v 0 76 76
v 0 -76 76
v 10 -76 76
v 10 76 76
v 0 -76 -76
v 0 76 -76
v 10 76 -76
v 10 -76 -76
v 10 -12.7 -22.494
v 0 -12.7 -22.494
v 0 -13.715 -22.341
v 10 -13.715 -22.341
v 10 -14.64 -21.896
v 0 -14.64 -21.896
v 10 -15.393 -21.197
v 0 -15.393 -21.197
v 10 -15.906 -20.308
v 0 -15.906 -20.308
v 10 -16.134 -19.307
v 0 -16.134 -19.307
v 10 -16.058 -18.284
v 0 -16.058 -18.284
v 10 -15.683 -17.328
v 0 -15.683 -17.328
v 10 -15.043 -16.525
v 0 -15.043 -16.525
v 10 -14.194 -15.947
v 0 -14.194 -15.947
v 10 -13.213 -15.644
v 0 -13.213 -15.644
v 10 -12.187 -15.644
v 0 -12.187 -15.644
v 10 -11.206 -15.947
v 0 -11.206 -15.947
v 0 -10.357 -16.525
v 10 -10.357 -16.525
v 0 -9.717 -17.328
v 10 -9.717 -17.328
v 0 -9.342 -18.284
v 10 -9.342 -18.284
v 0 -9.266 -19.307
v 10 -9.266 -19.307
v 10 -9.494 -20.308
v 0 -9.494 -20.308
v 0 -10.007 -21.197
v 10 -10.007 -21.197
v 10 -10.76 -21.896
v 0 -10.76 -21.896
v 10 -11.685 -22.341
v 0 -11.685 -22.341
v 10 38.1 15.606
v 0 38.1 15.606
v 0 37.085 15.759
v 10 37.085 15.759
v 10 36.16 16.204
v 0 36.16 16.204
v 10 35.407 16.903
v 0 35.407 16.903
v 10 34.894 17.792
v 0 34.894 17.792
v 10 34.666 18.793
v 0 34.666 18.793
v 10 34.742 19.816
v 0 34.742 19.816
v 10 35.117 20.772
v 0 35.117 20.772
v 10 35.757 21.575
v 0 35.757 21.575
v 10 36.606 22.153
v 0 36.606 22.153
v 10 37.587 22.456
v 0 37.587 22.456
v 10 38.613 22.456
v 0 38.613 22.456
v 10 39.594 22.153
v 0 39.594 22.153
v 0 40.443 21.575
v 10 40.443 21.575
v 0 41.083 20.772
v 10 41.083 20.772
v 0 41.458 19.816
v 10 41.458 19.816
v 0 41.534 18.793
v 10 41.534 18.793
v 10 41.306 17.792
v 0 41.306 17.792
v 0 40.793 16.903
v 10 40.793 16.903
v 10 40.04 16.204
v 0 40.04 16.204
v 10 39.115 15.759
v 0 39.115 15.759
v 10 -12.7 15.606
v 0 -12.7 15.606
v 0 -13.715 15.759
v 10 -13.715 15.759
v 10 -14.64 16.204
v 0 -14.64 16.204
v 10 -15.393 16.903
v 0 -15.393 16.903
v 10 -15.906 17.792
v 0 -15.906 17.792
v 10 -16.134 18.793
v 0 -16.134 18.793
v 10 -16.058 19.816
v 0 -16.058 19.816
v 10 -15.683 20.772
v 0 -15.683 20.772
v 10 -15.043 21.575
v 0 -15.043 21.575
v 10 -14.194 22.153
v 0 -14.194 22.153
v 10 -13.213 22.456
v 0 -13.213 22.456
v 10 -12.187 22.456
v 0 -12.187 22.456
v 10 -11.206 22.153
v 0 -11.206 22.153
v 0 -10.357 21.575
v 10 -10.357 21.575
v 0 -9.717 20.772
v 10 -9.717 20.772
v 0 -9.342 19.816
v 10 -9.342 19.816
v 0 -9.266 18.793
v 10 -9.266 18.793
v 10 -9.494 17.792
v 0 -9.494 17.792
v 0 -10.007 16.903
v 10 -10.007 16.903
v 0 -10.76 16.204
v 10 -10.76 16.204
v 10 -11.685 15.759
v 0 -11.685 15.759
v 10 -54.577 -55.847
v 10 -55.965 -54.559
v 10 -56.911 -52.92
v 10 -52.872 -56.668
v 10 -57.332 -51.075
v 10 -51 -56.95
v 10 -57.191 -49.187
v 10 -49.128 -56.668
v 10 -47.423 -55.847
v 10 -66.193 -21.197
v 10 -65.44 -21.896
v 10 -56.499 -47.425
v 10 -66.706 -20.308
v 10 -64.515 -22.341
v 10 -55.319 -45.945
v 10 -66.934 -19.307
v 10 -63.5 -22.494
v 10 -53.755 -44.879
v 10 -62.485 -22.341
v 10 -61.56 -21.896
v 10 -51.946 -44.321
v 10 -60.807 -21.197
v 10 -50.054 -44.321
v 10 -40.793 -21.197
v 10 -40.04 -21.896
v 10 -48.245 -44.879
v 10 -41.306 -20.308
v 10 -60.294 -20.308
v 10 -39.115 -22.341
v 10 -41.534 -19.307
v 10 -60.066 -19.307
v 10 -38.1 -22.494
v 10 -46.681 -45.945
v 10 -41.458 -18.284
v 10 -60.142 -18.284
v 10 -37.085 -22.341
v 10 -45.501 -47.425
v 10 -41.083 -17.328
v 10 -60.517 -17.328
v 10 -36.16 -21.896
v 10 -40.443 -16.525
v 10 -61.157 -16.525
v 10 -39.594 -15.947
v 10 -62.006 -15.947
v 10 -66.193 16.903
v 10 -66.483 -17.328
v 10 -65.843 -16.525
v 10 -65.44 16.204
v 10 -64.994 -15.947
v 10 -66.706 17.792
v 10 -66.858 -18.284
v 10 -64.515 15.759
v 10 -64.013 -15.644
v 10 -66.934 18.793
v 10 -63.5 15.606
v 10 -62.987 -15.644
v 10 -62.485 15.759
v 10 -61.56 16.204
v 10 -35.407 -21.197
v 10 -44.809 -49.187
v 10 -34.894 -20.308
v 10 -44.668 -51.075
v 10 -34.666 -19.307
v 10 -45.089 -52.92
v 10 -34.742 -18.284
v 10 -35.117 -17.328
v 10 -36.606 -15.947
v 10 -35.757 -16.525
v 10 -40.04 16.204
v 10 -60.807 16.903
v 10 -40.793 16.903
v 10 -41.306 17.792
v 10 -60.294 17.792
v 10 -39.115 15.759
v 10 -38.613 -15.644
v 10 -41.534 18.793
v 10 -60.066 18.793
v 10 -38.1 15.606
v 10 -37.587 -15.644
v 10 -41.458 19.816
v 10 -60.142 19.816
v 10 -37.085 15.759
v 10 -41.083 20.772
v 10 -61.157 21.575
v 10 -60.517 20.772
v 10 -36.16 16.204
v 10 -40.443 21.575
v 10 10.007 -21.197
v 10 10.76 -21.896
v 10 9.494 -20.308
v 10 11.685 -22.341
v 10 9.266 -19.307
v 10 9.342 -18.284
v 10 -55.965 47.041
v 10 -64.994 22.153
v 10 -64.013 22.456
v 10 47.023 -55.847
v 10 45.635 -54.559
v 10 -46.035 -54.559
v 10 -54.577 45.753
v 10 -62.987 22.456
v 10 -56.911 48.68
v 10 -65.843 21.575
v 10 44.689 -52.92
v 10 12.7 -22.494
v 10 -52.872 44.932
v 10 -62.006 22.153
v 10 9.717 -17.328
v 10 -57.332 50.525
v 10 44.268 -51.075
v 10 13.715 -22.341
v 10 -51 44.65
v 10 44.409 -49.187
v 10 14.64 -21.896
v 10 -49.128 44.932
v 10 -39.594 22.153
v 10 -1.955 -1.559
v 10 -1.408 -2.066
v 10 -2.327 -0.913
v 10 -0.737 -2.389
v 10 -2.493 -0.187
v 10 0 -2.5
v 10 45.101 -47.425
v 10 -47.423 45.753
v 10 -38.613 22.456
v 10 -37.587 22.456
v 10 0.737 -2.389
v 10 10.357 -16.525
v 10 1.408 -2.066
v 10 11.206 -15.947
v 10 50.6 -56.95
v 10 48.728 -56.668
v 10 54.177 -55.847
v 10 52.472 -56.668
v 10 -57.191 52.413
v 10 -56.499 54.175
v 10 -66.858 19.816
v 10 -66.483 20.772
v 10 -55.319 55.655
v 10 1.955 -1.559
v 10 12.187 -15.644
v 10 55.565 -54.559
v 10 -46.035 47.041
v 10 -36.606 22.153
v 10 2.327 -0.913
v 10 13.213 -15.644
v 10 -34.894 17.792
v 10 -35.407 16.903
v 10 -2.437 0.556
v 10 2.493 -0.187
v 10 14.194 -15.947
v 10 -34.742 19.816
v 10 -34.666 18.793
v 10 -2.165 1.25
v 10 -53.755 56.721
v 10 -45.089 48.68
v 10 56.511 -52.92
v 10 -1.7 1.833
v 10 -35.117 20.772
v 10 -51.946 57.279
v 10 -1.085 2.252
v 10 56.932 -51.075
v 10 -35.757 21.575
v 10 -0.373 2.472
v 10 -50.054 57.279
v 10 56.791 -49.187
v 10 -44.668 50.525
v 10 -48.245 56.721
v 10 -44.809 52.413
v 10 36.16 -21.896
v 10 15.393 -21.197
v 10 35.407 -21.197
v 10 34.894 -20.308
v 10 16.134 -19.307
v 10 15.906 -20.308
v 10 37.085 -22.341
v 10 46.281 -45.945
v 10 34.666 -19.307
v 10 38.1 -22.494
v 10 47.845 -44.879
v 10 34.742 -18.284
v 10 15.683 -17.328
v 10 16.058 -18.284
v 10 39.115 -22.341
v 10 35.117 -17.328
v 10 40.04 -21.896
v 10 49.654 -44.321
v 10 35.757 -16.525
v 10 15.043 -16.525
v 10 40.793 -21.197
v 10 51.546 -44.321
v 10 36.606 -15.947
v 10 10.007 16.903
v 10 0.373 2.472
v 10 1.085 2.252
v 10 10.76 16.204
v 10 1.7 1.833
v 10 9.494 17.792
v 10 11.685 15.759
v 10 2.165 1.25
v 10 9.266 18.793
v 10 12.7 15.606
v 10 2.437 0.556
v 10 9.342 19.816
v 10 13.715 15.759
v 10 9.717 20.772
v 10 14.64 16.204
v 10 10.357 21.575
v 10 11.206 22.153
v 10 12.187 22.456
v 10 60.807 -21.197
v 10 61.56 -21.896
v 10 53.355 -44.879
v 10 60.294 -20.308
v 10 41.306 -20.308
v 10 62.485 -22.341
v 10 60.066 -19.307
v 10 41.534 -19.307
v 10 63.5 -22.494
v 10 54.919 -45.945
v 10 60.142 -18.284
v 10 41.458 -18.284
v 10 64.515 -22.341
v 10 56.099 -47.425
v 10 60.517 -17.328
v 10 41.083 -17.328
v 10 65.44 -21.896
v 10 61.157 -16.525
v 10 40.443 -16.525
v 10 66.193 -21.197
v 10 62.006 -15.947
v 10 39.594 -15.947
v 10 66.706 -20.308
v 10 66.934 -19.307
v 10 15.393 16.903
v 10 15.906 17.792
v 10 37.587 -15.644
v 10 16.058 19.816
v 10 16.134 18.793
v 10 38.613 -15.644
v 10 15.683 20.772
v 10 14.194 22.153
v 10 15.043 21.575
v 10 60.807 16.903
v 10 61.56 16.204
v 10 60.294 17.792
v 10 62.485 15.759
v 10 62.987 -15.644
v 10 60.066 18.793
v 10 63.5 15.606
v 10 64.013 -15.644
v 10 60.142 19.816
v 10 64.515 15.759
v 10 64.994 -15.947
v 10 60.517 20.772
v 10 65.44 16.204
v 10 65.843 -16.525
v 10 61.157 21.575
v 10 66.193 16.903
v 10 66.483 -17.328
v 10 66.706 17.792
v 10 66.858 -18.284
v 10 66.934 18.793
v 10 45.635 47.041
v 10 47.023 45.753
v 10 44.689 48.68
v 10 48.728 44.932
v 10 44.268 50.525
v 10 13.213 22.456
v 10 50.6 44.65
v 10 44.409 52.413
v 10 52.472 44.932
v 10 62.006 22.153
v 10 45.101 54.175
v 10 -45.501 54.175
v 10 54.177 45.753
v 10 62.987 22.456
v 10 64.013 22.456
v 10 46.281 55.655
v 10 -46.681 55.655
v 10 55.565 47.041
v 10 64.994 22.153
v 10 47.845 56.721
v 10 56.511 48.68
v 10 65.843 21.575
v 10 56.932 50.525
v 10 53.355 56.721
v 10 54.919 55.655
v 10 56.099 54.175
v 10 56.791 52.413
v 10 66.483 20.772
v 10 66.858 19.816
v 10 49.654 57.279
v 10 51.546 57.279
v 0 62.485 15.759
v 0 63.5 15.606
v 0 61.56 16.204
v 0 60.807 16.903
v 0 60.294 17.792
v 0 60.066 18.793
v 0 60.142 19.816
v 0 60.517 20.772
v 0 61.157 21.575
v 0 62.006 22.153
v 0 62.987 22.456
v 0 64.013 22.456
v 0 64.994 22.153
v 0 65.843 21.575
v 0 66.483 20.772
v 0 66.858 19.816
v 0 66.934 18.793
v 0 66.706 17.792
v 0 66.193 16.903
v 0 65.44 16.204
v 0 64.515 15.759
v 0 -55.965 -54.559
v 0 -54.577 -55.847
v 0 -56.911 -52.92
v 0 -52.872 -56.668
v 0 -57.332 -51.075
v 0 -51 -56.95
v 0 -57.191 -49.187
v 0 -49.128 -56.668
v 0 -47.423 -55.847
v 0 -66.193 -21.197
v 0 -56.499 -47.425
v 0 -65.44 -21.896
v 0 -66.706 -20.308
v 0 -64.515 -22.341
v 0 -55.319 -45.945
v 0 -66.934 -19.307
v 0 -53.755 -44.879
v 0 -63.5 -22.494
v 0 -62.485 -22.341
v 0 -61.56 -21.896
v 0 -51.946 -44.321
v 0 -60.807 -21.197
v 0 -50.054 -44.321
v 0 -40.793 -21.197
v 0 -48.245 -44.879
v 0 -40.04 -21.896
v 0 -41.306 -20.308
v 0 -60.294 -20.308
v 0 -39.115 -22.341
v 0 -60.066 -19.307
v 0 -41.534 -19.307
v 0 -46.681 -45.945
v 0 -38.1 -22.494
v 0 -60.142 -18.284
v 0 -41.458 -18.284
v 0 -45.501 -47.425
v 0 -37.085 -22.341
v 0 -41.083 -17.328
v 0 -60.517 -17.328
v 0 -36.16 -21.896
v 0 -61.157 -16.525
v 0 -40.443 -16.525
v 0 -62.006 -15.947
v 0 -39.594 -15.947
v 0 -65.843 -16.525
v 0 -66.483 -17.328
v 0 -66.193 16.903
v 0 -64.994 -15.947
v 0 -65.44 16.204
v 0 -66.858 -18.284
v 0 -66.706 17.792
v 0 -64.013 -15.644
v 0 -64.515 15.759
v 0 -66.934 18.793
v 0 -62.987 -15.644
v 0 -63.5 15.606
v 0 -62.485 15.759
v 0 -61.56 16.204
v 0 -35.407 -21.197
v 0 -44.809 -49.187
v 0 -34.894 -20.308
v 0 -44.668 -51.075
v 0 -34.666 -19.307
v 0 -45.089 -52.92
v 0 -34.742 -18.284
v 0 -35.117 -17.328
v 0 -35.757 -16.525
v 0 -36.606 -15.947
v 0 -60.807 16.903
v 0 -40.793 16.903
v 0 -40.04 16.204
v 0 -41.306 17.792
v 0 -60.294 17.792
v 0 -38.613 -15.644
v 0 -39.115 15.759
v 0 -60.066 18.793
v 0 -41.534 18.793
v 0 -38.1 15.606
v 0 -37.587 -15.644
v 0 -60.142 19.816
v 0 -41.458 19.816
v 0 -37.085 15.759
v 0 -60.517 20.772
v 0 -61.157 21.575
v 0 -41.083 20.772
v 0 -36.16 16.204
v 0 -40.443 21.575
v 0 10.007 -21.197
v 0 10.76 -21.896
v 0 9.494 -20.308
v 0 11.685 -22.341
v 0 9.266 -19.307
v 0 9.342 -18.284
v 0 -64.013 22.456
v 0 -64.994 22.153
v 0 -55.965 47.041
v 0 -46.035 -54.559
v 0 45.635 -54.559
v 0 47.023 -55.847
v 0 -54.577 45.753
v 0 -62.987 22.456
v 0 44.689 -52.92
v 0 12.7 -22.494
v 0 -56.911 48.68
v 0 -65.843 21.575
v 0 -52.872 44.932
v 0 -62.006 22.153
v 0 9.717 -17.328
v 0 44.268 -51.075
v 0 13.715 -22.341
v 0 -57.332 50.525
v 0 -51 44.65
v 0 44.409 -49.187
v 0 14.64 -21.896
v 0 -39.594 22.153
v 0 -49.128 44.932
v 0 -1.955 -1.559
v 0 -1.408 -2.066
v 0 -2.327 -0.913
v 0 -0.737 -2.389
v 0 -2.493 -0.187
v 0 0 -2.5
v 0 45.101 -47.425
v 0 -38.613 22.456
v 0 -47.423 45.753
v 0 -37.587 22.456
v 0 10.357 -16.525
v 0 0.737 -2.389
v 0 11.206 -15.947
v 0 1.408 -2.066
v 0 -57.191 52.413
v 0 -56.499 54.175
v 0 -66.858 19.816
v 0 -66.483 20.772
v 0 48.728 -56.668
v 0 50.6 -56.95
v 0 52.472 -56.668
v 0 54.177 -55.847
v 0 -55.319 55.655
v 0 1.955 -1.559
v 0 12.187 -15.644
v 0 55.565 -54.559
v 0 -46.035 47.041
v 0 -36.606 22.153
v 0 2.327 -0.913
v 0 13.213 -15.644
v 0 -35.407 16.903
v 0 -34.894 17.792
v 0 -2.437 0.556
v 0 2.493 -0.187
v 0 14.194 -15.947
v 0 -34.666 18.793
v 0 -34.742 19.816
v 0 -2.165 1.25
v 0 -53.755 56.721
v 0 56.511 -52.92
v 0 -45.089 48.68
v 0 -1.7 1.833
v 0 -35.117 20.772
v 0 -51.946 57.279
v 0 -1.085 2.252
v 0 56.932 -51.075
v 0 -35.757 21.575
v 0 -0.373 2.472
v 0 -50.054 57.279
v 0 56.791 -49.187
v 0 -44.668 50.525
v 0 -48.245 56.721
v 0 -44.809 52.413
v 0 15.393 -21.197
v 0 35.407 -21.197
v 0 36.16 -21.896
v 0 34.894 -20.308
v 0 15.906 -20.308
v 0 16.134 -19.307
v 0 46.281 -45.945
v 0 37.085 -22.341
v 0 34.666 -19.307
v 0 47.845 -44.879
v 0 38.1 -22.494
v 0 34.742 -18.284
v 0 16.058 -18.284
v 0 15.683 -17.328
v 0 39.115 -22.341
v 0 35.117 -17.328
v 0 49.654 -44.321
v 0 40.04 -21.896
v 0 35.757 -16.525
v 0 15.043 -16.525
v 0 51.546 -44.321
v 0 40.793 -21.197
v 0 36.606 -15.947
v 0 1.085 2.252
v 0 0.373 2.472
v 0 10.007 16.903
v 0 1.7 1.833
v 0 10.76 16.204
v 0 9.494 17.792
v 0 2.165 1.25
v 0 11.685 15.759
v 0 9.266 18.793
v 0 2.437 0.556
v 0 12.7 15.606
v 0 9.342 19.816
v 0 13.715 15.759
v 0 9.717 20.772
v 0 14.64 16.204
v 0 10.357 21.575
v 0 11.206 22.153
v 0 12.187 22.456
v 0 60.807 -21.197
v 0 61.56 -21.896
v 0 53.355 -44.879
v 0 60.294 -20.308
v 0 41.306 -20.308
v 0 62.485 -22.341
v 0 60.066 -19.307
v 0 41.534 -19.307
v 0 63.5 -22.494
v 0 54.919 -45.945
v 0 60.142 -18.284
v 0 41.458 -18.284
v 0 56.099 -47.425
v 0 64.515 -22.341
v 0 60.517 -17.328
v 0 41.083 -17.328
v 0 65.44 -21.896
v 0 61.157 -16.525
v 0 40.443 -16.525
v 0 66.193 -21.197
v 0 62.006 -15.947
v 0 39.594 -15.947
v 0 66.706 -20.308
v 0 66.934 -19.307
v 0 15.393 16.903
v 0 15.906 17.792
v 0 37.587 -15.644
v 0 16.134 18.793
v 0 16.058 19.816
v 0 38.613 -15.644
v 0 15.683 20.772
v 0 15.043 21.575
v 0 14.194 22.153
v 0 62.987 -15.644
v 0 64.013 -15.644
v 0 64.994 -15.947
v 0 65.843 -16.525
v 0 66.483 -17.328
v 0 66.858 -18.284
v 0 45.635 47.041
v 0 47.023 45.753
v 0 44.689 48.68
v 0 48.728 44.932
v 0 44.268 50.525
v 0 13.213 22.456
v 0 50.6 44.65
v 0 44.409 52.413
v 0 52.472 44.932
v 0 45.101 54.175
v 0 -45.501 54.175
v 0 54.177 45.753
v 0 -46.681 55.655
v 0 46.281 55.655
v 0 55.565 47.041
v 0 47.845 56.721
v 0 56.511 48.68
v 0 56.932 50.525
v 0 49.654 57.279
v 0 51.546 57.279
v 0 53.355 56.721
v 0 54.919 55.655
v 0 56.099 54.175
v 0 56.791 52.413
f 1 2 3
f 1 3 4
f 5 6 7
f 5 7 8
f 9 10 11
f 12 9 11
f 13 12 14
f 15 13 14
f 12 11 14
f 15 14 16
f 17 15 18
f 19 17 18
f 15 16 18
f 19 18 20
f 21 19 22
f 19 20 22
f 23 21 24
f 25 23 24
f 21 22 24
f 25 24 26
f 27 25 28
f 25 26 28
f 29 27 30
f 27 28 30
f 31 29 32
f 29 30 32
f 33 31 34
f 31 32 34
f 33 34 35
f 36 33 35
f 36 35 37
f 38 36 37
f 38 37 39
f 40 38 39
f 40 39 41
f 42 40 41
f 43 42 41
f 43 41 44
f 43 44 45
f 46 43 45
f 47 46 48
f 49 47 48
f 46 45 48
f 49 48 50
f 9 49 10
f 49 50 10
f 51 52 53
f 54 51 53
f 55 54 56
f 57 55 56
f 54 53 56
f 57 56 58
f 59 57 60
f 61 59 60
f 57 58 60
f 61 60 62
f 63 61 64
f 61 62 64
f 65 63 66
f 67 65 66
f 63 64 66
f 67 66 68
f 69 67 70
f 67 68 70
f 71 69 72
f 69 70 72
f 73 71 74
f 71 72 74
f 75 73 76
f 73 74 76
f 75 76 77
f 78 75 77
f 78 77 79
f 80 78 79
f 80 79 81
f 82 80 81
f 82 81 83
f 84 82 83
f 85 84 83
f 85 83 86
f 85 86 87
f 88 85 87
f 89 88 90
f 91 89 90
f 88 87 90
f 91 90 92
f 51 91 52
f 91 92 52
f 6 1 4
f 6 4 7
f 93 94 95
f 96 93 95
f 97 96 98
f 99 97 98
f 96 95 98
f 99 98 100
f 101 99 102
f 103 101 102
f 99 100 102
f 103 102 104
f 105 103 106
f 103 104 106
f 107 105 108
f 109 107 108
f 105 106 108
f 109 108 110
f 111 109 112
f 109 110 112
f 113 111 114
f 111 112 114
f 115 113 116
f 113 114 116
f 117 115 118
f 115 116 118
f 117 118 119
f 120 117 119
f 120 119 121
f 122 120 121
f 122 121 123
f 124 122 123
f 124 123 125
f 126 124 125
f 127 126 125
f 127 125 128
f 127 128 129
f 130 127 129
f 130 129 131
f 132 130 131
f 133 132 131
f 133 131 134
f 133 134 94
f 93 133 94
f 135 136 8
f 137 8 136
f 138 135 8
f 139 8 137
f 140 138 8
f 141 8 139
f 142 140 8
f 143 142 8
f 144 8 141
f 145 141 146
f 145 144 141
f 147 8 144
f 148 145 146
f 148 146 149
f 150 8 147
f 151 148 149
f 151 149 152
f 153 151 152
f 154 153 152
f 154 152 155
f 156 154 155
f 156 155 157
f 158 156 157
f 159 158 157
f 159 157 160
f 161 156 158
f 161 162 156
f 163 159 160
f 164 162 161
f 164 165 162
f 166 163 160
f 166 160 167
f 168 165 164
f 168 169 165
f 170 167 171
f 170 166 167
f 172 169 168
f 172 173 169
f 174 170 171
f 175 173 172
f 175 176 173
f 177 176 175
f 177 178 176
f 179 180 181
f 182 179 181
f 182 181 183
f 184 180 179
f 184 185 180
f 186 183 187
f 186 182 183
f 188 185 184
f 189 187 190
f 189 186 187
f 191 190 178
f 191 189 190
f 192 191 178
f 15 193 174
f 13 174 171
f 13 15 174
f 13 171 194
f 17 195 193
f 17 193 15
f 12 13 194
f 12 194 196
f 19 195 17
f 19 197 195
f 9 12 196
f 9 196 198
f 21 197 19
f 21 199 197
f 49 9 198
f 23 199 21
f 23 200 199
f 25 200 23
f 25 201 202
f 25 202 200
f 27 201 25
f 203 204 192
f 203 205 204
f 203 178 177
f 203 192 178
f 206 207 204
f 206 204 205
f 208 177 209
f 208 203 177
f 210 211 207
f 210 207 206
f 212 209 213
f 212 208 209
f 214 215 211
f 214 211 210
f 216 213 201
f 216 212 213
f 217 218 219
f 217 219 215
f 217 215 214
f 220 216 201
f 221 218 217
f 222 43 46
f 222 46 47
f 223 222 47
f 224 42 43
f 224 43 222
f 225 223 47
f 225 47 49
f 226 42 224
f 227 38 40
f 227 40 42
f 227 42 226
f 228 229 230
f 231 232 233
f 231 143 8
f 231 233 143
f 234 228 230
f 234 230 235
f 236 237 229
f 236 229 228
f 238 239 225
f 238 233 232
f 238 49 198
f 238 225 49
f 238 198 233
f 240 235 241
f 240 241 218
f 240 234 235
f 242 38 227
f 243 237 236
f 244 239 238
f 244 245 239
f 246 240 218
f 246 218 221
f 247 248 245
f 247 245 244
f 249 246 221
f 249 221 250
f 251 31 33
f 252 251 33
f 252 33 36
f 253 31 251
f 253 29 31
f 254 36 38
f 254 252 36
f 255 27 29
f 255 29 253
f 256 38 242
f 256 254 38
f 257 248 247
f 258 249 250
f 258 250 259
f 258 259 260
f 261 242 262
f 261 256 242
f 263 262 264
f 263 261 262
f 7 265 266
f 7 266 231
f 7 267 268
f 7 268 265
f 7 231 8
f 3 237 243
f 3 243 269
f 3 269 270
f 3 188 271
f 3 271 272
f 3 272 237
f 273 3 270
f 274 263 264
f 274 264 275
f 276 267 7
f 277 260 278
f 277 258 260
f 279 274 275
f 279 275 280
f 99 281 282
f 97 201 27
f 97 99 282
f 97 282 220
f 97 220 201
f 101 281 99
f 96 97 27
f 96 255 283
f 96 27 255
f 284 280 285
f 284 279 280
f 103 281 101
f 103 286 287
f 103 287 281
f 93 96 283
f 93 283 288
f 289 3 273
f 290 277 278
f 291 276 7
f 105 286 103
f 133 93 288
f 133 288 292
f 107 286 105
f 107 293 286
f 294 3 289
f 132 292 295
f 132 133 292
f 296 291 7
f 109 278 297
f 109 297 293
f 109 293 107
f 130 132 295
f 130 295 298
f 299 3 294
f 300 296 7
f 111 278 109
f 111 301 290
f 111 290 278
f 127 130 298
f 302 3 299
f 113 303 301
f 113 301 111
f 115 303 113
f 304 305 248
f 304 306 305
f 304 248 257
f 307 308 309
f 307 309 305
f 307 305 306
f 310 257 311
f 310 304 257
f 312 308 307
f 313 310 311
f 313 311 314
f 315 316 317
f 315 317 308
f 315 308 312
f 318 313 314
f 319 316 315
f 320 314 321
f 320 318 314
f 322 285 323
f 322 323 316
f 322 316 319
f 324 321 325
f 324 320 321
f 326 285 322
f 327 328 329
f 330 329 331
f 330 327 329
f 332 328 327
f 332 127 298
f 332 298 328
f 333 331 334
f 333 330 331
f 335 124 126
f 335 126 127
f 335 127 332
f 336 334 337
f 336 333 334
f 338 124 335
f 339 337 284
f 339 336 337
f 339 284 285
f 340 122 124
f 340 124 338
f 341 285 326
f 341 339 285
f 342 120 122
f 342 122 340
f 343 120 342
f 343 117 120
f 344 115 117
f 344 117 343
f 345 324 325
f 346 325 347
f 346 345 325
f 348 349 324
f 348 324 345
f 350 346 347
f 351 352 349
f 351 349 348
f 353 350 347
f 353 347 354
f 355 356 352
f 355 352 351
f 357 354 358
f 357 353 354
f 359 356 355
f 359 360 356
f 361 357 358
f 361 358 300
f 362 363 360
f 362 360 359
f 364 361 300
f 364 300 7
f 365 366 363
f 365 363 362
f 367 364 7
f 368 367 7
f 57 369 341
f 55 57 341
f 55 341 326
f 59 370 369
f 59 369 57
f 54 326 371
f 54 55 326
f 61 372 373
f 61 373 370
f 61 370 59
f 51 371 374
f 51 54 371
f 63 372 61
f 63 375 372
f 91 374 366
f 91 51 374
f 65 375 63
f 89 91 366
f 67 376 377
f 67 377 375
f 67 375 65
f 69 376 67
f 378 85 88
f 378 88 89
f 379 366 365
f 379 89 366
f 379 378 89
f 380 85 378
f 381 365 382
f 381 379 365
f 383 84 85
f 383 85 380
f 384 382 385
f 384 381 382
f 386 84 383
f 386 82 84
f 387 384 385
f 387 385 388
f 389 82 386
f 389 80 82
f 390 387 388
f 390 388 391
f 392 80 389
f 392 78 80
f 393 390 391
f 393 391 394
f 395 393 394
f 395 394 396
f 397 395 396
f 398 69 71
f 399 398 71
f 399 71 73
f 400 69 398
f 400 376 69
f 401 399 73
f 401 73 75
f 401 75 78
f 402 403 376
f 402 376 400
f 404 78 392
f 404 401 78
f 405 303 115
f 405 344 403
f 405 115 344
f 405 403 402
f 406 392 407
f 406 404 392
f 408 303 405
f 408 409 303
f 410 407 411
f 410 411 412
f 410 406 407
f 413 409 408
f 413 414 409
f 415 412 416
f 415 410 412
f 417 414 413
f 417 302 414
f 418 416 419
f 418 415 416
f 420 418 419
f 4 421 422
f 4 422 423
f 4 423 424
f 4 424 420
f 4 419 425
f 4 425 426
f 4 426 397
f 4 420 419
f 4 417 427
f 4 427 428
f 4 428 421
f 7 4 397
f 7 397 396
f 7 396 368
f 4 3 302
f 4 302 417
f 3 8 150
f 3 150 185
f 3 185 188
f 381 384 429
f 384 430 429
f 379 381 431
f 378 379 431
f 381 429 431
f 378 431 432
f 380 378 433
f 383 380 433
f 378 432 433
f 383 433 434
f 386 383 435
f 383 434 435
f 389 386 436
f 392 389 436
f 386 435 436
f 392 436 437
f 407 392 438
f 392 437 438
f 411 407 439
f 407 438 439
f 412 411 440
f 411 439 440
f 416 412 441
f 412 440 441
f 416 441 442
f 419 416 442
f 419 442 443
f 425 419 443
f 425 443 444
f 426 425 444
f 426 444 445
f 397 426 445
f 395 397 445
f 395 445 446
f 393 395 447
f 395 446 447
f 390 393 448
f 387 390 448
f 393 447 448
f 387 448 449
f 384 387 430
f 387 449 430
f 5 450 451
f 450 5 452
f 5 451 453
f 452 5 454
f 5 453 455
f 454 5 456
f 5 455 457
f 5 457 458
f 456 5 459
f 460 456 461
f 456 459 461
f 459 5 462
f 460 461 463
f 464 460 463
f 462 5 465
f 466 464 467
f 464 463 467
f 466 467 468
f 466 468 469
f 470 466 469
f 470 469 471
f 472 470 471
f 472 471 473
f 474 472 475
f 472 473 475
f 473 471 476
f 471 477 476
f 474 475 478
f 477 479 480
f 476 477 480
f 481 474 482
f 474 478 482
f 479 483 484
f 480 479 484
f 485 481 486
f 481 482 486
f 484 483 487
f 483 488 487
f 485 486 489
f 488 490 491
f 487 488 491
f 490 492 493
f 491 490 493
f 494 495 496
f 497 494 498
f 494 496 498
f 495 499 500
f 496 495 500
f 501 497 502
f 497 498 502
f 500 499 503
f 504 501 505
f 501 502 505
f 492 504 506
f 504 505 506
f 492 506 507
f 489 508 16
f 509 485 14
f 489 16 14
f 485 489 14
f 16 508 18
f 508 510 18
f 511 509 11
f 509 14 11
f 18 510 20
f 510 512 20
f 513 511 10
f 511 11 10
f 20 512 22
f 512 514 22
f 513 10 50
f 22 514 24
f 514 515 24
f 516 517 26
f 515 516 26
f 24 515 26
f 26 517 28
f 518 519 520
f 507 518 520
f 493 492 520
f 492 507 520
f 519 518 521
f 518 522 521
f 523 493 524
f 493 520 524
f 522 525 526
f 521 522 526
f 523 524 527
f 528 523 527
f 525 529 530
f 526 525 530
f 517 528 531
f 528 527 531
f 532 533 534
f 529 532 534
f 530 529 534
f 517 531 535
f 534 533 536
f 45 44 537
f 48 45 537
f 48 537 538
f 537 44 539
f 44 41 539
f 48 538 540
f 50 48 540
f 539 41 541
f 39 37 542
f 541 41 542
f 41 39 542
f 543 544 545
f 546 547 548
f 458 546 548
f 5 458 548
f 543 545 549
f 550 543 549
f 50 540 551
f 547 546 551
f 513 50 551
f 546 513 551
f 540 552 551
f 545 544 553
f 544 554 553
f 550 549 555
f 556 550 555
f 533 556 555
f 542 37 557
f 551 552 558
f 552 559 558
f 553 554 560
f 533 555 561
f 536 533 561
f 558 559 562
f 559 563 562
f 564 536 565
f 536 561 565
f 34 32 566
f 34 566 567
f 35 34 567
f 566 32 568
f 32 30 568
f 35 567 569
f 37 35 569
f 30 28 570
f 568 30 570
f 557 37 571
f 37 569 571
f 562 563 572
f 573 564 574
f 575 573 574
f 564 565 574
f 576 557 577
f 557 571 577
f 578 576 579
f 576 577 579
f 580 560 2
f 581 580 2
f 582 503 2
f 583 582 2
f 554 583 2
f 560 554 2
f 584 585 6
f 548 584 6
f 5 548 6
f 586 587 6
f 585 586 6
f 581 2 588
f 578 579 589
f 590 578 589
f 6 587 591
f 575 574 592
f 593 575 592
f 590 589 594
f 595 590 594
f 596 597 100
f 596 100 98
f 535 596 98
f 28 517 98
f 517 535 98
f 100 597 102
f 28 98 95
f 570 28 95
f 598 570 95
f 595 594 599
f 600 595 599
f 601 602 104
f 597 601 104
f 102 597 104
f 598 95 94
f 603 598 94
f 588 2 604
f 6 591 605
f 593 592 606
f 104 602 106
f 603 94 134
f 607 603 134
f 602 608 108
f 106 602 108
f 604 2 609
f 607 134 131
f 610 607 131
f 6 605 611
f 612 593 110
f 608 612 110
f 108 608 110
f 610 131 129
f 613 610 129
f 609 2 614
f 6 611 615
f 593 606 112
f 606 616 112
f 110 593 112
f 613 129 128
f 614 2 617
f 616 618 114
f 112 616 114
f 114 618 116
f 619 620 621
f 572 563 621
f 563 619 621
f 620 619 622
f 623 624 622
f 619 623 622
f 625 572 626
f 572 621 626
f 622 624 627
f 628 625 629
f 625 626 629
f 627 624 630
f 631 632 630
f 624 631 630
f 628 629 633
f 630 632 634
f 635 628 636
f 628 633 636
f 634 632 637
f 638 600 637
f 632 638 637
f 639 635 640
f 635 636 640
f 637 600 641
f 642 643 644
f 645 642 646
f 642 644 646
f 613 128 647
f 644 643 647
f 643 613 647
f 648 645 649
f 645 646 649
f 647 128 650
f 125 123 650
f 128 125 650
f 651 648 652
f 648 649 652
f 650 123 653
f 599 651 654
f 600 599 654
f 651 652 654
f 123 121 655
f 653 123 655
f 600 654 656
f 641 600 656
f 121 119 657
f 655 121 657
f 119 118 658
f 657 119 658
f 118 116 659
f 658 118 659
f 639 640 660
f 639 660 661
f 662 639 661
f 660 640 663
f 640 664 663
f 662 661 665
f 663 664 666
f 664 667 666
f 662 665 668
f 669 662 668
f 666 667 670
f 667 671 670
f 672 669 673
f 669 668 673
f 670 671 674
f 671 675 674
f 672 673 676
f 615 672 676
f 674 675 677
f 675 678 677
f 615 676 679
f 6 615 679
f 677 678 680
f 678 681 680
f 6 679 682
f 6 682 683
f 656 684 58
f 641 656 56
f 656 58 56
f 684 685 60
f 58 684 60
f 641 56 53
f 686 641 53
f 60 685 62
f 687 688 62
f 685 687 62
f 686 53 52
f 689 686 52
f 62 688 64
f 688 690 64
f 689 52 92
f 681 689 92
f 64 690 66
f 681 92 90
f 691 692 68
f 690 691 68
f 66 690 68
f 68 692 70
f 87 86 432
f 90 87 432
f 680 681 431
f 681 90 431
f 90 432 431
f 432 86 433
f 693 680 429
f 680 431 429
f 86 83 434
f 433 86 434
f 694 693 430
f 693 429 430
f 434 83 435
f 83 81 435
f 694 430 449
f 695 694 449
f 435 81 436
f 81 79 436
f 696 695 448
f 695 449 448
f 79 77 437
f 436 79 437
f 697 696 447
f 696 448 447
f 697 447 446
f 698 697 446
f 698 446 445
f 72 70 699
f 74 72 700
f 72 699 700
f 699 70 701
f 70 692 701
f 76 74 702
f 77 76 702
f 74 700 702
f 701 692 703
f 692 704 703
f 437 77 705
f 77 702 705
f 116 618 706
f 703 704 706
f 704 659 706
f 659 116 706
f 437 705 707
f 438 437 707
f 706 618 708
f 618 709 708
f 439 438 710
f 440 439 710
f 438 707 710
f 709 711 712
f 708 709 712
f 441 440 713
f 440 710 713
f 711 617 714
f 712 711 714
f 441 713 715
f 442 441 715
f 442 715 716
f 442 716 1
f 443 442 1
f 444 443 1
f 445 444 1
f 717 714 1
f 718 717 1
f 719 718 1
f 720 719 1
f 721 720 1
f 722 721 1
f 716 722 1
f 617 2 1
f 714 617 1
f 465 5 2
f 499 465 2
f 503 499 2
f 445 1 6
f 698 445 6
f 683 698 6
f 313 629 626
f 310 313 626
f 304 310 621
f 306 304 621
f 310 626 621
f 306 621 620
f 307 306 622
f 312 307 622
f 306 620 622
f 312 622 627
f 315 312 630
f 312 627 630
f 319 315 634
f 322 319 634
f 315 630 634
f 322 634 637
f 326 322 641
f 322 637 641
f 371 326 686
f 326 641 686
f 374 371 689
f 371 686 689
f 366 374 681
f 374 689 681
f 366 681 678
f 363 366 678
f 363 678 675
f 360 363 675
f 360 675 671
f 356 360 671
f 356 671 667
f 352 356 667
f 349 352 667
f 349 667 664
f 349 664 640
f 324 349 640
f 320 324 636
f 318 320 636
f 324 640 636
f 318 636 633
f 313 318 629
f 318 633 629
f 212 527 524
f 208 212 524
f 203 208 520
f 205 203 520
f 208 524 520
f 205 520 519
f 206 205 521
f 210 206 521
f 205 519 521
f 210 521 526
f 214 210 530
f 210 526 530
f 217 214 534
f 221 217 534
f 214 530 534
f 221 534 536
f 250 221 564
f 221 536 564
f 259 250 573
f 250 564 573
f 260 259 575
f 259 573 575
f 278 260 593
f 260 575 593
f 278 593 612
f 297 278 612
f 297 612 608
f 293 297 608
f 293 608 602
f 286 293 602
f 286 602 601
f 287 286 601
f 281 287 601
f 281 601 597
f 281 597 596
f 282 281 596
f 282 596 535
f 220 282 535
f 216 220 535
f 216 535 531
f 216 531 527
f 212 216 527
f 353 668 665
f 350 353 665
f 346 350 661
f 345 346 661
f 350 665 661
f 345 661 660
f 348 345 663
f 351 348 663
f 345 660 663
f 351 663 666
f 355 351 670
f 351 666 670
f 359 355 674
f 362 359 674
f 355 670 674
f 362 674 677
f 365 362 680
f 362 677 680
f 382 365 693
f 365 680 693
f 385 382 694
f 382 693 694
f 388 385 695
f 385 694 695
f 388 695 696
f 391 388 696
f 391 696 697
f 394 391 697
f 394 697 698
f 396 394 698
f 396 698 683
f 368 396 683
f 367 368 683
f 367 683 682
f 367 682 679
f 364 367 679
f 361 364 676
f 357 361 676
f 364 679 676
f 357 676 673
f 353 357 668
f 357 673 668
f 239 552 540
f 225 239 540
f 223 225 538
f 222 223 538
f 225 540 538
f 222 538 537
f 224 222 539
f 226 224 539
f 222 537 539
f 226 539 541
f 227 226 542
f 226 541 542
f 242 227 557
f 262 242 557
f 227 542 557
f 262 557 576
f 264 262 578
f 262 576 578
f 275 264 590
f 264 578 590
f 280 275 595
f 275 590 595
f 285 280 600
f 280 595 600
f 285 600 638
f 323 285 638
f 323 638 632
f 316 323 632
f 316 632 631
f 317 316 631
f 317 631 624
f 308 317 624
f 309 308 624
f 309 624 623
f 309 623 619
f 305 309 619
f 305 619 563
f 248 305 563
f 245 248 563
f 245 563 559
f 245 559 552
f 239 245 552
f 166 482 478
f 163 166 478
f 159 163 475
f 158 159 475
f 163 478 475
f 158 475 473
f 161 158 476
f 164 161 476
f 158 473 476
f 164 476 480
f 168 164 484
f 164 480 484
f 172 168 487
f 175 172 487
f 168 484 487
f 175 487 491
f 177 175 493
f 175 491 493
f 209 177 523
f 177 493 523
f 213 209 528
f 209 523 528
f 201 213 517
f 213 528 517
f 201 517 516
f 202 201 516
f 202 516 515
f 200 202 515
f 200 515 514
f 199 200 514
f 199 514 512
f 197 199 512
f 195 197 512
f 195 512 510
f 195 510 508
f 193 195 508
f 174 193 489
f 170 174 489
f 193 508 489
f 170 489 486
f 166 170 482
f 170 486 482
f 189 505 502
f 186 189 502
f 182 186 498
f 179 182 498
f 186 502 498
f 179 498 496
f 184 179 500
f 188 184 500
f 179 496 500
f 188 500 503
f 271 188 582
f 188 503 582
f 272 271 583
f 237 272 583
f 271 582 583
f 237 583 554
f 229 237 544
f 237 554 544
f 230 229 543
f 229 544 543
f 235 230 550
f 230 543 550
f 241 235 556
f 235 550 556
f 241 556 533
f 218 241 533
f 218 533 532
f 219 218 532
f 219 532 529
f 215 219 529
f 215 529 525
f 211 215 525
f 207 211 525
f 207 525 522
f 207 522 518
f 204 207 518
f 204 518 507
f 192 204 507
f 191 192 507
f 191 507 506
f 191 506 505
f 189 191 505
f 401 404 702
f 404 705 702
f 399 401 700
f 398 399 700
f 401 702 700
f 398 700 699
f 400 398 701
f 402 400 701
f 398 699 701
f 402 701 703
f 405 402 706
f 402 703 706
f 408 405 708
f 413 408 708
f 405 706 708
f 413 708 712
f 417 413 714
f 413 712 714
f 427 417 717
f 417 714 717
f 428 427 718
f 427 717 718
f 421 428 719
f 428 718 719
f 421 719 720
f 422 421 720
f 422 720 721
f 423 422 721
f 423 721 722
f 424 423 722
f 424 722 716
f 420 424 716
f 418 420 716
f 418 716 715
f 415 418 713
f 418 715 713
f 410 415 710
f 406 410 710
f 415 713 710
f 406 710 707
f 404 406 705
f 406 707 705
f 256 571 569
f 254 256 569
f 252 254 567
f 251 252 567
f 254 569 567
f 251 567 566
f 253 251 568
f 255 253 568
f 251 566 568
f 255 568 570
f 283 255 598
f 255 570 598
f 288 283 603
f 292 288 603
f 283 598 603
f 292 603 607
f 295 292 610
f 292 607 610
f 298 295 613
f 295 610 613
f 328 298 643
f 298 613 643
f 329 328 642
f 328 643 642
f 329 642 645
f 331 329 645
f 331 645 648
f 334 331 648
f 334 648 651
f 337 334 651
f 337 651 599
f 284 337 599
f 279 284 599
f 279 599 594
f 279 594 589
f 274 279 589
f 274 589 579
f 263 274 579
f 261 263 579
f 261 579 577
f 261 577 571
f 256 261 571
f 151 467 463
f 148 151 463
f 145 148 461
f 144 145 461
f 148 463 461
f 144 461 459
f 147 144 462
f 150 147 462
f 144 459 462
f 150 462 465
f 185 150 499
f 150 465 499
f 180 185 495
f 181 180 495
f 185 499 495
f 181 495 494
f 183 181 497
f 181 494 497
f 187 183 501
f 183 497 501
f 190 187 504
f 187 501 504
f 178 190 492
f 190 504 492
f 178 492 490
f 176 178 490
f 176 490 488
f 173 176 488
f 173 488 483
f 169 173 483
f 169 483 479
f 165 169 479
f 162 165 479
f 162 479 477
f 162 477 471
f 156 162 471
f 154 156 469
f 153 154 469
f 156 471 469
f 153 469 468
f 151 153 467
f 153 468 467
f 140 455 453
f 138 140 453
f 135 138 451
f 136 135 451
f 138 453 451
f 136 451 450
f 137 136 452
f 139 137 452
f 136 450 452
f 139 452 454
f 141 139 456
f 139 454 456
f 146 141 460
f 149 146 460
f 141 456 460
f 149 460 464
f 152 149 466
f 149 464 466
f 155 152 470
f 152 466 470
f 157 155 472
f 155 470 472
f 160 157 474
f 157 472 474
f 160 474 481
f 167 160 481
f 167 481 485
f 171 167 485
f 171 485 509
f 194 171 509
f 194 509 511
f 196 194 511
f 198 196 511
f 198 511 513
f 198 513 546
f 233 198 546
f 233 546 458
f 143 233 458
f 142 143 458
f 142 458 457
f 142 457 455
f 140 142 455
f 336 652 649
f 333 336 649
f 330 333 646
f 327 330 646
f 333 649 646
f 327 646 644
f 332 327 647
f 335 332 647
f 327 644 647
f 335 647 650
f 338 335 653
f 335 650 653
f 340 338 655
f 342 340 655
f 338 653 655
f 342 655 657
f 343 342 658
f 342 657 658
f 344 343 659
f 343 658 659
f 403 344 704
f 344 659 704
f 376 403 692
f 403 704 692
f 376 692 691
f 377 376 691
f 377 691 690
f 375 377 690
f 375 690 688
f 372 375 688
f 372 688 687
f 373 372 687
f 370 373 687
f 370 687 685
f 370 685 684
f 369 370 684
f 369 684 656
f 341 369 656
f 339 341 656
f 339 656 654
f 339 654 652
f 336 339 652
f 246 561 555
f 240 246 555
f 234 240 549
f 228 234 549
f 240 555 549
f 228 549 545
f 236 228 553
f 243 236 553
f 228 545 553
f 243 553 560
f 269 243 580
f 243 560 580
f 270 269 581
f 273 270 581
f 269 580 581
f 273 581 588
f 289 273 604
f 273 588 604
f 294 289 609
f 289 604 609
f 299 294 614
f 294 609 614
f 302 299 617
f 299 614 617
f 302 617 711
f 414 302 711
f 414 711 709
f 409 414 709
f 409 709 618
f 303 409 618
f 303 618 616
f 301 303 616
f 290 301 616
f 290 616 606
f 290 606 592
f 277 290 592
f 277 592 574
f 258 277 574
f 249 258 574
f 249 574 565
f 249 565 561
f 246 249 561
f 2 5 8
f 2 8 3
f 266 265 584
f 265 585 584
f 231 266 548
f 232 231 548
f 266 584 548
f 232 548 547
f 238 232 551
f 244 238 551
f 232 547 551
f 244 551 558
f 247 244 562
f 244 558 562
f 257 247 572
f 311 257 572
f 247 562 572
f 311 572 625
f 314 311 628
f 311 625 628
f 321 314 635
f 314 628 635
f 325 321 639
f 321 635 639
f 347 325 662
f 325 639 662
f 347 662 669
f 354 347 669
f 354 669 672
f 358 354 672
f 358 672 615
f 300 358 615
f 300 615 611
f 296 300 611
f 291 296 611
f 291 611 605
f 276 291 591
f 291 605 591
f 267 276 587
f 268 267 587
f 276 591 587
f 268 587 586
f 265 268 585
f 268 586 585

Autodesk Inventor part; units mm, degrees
ref_plane "YZ Plane" through (0, 0, 0) normal (1, 0, 0) x (0, 1, 0)
ref_plane "XZ Plane" through (0, 0, 0) normal (0, 1, 0) x (-1, 0, 0)
ref_plane "XY Plane" through (0, 0, 0) normal (0, 0, 1) x (1, 0, 0)
sketch "Sketch5" plane through (0, 0, 0) normal (1, 0, 0) x (0, 1, 0)
  line L0 (76, -76) -> (-76, -76)
  line L1 (-76, -76) -> (-76, 76)
  line L2 (-76, 76) -> (76, 76)
  line L3 (76, 76) -> (76, -76)
  line L4 (76, -76) -> (-76, 76) construction
  line L5 (-76, -76) -> (76, 76) construction
  point P0 (0, 0)
  dimension "d31" = 152
  dimension "d32" = 152
extrude "Extrusion2" add sketch "Sketch5" along normal blind 10
sketch "Sketch6" plane through (10, 0, 0) normal (1, 0, 0) x (0, 0, -1)
  line L0 (76, -76) -> (76, 76) projected
  line L1 (76, 76) -> (-76, 76) projected
  point P0 (0, 0)
  point P1 (50.6, 50.6)
  dimension "d42" = 25.4
  dimension "d43" = 25.4
hole "Hole4" at (10, 50.6, -50.6) direction (-1, 0, 0) diameter 12.7 end through all
sketch "Sketch7" plane through (10, 0, 0) normal (1, 0, 0) x (0, 0, -1)
  circle A0 centre (50.6, 50.6) radius 6.35 projected
  line L0 (76, 76) -> (-76, 76) projected
  point P0 (0, 0)
  point P1 (-51, 50.6)
  dimension "d51" = 101.6
  dimension "d52" = 25.4
hole "Hole5" at (10, 50.6, 51) direction (-1, 0, 0) diameter 12.7 end through all
sketch "Sketch8" plane through (10, 0, 0) normal (1, 0, 0) x (0, 0, -1)
  line L0 (76, -76) -> (76, 76) projected
  circle A0 centre (50.6, 50.6) radius 6.35 projected
  point P0 (0, 0)
  point P1 (50.6, -51)
  dimension "d60" = 25.4
  dimension "d61" = 101.6
hole "Hole6" at (10, -51, -50.6) direction (-1, 0, 0) diameter 12.7 end through all
sketch "Sketch9" plane through (10, 0, 0) normal (1, 0, 0) x (0, 0, -1)
  circle A0 centre (-51, 50.6) radius 6.35 projected
  circle A1 centre (50.6, -51) radius 6.35 projected
  point P0 (0, 0)
  point P1 (-51, -51)
  dimension "d69" = 101.6
  dimension "d70" = 101.6
hole "Hole7" at (10, -51, 51) direction (-1, 0, 0) diameter 12.7 end through all
sketch "Sketch10" plane through (10, 0, 0) normal (1, 0, 0) x (0, 0, -1)
  line L0 (76, 76) -> (-76, 76) projected
  line L1 (76, -76) -> (76, 76) projected
  point P0 (0, 0)
  point P1 (19.05, 63.5)
  dimension "d93" = 12.5
  dimension "d103" = 56.95
hole "Hole8" at (10, 63.5, -19.05) direction (-1, 0, 0) diameter 6.888 end through all
sketch "Sketch11" plane through (10, 0, 0) normal (1, 0, 0) x (0, 0, -1)
  circle A0 centre (19.05, 63.5) radius 3.444 projected
  point P0 (0, 0)
  point P1 (-19.05, 63.5)
  dimension "d85" = 38.1
  dimension "d86" = 0
hole "Hole9" at (10, 63.5, 19.05) direction (-1, 0, 0) diameter 6.888 end through all
pattern_linear "Rectangular Pattern1" count 6 spacing 25.4 along (0, -1, 0) of "Hole8"
pattern_linear "Rectangular Pattern2" count 6 spacing 25.4 along (0, -1, 0) of "Hole9"
sketch "Sketch12" plane through (10, 0, 0) normal (1, 0, 0) x (0, 0, -1)
  line L0 (76, -76) -> (76, 76) projected
  line L1 (-76, -76) -> (76, -76) projected
  point P0 (0, 0)
  point P1 (0, 0)
  dimension "d101" = 76
  dimension "d102" = 76
hole "Hole10" at (10, 0, 0) direction (-1, 0, 0) diameter 5 end through all
properties part number "base_plate"
